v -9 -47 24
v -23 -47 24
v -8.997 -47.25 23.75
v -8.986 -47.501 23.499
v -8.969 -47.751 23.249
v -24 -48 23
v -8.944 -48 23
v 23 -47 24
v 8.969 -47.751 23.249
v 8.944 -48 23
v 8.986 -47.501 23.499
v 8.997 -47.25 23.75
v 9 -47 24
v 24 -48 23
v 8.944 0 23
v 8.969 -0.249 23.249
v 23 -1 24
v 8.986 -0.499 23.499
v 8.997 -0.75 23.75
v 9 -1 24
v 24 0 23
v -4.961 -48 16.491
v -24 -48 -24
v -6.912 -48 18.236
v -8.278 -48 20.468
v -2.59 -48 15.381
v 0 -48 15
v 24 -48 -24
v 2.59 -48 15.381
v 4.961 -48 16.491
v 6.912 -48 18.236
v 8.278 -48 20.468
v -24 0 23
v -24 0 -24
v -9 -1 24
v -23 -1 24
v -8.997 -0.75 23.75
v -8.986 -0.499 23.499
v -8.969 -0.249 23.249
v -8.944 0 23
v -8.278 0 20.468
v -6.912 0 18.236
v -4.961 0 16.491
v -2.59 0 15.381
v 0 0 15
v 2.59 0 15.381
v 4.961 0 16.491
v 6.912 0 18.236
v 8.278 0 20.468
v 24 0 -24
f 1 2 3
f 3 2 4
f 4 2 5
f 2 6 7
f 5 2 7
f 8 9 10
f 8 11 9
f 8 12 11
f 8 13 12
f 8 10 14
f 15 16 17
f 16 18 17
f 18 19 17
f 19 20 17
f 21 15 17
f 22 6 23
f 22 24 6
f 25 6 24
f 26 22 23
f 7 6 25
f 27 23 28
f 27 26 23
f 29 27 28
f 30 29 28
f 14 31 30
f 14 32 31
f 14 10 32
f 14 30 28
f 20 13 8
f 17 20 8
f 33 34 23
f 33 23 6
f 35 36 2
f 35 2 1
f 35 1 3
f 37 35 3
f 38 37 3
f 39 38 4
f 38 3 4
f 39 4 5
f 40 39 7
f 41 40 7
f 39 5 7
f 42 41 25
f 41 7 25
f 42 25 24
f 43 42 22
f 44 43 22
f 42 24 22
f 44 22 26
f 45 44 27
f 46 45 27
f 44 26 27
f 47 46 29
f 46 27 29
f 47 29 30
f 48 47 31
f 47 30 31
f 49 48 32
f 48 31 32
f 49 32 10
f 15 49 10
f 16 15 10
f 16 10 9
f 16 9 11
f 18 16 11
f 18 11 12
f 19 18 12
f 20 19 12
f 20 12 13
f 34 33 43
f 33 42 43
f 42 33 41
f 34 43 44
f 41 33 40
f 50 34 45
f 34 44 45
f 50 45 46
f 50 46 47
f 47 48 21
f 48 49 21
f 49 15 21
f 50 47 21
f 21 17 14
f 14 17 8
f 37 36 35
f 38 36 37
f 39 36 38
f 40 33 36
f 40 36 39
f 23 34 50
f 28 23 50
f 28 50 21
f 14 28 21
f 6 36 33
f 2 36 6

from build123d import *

# Parameters (mm, degrees)
F0_W     = 48
F0_H     = 48
F1_DEPTH = 48
F3_DEPTH = 48
F4_SIZE  = 1


with BuildPart() as f1:
    # F0 (on Front) → F1 (new body)
    with BuildSketch(Plane.XZ):
        Rectangle(F0_W, F0_H)
    extrude(amount=F1_DEPTH)

    # F2 (on face) → F3 (cut)
    with BuildSketch(Plane.XZ.offset(48)):
        with BuildLine():
            ThreePointArc((-9, 24), (0, 15), (9, 24))
            Line((9, 24), (-9, 24))
        make_face()
    extrude(amount=-F3_DEPTH, mode=Mode.SUBTRACT)

    # F4
    f4_edges = [f1.edges().sort_by_distance(p)[0] for p in [
        (16.5, -48, 24),
        (-16.5, -48, 24),
        (24, -24, 24),
        (16.5, 0, 24),
        (-16.5, 0, 24),
        (-24, -24, 24),
    ]]
    chamfer(f4_edges, length=F4_SIZE)


solid = f1.part
